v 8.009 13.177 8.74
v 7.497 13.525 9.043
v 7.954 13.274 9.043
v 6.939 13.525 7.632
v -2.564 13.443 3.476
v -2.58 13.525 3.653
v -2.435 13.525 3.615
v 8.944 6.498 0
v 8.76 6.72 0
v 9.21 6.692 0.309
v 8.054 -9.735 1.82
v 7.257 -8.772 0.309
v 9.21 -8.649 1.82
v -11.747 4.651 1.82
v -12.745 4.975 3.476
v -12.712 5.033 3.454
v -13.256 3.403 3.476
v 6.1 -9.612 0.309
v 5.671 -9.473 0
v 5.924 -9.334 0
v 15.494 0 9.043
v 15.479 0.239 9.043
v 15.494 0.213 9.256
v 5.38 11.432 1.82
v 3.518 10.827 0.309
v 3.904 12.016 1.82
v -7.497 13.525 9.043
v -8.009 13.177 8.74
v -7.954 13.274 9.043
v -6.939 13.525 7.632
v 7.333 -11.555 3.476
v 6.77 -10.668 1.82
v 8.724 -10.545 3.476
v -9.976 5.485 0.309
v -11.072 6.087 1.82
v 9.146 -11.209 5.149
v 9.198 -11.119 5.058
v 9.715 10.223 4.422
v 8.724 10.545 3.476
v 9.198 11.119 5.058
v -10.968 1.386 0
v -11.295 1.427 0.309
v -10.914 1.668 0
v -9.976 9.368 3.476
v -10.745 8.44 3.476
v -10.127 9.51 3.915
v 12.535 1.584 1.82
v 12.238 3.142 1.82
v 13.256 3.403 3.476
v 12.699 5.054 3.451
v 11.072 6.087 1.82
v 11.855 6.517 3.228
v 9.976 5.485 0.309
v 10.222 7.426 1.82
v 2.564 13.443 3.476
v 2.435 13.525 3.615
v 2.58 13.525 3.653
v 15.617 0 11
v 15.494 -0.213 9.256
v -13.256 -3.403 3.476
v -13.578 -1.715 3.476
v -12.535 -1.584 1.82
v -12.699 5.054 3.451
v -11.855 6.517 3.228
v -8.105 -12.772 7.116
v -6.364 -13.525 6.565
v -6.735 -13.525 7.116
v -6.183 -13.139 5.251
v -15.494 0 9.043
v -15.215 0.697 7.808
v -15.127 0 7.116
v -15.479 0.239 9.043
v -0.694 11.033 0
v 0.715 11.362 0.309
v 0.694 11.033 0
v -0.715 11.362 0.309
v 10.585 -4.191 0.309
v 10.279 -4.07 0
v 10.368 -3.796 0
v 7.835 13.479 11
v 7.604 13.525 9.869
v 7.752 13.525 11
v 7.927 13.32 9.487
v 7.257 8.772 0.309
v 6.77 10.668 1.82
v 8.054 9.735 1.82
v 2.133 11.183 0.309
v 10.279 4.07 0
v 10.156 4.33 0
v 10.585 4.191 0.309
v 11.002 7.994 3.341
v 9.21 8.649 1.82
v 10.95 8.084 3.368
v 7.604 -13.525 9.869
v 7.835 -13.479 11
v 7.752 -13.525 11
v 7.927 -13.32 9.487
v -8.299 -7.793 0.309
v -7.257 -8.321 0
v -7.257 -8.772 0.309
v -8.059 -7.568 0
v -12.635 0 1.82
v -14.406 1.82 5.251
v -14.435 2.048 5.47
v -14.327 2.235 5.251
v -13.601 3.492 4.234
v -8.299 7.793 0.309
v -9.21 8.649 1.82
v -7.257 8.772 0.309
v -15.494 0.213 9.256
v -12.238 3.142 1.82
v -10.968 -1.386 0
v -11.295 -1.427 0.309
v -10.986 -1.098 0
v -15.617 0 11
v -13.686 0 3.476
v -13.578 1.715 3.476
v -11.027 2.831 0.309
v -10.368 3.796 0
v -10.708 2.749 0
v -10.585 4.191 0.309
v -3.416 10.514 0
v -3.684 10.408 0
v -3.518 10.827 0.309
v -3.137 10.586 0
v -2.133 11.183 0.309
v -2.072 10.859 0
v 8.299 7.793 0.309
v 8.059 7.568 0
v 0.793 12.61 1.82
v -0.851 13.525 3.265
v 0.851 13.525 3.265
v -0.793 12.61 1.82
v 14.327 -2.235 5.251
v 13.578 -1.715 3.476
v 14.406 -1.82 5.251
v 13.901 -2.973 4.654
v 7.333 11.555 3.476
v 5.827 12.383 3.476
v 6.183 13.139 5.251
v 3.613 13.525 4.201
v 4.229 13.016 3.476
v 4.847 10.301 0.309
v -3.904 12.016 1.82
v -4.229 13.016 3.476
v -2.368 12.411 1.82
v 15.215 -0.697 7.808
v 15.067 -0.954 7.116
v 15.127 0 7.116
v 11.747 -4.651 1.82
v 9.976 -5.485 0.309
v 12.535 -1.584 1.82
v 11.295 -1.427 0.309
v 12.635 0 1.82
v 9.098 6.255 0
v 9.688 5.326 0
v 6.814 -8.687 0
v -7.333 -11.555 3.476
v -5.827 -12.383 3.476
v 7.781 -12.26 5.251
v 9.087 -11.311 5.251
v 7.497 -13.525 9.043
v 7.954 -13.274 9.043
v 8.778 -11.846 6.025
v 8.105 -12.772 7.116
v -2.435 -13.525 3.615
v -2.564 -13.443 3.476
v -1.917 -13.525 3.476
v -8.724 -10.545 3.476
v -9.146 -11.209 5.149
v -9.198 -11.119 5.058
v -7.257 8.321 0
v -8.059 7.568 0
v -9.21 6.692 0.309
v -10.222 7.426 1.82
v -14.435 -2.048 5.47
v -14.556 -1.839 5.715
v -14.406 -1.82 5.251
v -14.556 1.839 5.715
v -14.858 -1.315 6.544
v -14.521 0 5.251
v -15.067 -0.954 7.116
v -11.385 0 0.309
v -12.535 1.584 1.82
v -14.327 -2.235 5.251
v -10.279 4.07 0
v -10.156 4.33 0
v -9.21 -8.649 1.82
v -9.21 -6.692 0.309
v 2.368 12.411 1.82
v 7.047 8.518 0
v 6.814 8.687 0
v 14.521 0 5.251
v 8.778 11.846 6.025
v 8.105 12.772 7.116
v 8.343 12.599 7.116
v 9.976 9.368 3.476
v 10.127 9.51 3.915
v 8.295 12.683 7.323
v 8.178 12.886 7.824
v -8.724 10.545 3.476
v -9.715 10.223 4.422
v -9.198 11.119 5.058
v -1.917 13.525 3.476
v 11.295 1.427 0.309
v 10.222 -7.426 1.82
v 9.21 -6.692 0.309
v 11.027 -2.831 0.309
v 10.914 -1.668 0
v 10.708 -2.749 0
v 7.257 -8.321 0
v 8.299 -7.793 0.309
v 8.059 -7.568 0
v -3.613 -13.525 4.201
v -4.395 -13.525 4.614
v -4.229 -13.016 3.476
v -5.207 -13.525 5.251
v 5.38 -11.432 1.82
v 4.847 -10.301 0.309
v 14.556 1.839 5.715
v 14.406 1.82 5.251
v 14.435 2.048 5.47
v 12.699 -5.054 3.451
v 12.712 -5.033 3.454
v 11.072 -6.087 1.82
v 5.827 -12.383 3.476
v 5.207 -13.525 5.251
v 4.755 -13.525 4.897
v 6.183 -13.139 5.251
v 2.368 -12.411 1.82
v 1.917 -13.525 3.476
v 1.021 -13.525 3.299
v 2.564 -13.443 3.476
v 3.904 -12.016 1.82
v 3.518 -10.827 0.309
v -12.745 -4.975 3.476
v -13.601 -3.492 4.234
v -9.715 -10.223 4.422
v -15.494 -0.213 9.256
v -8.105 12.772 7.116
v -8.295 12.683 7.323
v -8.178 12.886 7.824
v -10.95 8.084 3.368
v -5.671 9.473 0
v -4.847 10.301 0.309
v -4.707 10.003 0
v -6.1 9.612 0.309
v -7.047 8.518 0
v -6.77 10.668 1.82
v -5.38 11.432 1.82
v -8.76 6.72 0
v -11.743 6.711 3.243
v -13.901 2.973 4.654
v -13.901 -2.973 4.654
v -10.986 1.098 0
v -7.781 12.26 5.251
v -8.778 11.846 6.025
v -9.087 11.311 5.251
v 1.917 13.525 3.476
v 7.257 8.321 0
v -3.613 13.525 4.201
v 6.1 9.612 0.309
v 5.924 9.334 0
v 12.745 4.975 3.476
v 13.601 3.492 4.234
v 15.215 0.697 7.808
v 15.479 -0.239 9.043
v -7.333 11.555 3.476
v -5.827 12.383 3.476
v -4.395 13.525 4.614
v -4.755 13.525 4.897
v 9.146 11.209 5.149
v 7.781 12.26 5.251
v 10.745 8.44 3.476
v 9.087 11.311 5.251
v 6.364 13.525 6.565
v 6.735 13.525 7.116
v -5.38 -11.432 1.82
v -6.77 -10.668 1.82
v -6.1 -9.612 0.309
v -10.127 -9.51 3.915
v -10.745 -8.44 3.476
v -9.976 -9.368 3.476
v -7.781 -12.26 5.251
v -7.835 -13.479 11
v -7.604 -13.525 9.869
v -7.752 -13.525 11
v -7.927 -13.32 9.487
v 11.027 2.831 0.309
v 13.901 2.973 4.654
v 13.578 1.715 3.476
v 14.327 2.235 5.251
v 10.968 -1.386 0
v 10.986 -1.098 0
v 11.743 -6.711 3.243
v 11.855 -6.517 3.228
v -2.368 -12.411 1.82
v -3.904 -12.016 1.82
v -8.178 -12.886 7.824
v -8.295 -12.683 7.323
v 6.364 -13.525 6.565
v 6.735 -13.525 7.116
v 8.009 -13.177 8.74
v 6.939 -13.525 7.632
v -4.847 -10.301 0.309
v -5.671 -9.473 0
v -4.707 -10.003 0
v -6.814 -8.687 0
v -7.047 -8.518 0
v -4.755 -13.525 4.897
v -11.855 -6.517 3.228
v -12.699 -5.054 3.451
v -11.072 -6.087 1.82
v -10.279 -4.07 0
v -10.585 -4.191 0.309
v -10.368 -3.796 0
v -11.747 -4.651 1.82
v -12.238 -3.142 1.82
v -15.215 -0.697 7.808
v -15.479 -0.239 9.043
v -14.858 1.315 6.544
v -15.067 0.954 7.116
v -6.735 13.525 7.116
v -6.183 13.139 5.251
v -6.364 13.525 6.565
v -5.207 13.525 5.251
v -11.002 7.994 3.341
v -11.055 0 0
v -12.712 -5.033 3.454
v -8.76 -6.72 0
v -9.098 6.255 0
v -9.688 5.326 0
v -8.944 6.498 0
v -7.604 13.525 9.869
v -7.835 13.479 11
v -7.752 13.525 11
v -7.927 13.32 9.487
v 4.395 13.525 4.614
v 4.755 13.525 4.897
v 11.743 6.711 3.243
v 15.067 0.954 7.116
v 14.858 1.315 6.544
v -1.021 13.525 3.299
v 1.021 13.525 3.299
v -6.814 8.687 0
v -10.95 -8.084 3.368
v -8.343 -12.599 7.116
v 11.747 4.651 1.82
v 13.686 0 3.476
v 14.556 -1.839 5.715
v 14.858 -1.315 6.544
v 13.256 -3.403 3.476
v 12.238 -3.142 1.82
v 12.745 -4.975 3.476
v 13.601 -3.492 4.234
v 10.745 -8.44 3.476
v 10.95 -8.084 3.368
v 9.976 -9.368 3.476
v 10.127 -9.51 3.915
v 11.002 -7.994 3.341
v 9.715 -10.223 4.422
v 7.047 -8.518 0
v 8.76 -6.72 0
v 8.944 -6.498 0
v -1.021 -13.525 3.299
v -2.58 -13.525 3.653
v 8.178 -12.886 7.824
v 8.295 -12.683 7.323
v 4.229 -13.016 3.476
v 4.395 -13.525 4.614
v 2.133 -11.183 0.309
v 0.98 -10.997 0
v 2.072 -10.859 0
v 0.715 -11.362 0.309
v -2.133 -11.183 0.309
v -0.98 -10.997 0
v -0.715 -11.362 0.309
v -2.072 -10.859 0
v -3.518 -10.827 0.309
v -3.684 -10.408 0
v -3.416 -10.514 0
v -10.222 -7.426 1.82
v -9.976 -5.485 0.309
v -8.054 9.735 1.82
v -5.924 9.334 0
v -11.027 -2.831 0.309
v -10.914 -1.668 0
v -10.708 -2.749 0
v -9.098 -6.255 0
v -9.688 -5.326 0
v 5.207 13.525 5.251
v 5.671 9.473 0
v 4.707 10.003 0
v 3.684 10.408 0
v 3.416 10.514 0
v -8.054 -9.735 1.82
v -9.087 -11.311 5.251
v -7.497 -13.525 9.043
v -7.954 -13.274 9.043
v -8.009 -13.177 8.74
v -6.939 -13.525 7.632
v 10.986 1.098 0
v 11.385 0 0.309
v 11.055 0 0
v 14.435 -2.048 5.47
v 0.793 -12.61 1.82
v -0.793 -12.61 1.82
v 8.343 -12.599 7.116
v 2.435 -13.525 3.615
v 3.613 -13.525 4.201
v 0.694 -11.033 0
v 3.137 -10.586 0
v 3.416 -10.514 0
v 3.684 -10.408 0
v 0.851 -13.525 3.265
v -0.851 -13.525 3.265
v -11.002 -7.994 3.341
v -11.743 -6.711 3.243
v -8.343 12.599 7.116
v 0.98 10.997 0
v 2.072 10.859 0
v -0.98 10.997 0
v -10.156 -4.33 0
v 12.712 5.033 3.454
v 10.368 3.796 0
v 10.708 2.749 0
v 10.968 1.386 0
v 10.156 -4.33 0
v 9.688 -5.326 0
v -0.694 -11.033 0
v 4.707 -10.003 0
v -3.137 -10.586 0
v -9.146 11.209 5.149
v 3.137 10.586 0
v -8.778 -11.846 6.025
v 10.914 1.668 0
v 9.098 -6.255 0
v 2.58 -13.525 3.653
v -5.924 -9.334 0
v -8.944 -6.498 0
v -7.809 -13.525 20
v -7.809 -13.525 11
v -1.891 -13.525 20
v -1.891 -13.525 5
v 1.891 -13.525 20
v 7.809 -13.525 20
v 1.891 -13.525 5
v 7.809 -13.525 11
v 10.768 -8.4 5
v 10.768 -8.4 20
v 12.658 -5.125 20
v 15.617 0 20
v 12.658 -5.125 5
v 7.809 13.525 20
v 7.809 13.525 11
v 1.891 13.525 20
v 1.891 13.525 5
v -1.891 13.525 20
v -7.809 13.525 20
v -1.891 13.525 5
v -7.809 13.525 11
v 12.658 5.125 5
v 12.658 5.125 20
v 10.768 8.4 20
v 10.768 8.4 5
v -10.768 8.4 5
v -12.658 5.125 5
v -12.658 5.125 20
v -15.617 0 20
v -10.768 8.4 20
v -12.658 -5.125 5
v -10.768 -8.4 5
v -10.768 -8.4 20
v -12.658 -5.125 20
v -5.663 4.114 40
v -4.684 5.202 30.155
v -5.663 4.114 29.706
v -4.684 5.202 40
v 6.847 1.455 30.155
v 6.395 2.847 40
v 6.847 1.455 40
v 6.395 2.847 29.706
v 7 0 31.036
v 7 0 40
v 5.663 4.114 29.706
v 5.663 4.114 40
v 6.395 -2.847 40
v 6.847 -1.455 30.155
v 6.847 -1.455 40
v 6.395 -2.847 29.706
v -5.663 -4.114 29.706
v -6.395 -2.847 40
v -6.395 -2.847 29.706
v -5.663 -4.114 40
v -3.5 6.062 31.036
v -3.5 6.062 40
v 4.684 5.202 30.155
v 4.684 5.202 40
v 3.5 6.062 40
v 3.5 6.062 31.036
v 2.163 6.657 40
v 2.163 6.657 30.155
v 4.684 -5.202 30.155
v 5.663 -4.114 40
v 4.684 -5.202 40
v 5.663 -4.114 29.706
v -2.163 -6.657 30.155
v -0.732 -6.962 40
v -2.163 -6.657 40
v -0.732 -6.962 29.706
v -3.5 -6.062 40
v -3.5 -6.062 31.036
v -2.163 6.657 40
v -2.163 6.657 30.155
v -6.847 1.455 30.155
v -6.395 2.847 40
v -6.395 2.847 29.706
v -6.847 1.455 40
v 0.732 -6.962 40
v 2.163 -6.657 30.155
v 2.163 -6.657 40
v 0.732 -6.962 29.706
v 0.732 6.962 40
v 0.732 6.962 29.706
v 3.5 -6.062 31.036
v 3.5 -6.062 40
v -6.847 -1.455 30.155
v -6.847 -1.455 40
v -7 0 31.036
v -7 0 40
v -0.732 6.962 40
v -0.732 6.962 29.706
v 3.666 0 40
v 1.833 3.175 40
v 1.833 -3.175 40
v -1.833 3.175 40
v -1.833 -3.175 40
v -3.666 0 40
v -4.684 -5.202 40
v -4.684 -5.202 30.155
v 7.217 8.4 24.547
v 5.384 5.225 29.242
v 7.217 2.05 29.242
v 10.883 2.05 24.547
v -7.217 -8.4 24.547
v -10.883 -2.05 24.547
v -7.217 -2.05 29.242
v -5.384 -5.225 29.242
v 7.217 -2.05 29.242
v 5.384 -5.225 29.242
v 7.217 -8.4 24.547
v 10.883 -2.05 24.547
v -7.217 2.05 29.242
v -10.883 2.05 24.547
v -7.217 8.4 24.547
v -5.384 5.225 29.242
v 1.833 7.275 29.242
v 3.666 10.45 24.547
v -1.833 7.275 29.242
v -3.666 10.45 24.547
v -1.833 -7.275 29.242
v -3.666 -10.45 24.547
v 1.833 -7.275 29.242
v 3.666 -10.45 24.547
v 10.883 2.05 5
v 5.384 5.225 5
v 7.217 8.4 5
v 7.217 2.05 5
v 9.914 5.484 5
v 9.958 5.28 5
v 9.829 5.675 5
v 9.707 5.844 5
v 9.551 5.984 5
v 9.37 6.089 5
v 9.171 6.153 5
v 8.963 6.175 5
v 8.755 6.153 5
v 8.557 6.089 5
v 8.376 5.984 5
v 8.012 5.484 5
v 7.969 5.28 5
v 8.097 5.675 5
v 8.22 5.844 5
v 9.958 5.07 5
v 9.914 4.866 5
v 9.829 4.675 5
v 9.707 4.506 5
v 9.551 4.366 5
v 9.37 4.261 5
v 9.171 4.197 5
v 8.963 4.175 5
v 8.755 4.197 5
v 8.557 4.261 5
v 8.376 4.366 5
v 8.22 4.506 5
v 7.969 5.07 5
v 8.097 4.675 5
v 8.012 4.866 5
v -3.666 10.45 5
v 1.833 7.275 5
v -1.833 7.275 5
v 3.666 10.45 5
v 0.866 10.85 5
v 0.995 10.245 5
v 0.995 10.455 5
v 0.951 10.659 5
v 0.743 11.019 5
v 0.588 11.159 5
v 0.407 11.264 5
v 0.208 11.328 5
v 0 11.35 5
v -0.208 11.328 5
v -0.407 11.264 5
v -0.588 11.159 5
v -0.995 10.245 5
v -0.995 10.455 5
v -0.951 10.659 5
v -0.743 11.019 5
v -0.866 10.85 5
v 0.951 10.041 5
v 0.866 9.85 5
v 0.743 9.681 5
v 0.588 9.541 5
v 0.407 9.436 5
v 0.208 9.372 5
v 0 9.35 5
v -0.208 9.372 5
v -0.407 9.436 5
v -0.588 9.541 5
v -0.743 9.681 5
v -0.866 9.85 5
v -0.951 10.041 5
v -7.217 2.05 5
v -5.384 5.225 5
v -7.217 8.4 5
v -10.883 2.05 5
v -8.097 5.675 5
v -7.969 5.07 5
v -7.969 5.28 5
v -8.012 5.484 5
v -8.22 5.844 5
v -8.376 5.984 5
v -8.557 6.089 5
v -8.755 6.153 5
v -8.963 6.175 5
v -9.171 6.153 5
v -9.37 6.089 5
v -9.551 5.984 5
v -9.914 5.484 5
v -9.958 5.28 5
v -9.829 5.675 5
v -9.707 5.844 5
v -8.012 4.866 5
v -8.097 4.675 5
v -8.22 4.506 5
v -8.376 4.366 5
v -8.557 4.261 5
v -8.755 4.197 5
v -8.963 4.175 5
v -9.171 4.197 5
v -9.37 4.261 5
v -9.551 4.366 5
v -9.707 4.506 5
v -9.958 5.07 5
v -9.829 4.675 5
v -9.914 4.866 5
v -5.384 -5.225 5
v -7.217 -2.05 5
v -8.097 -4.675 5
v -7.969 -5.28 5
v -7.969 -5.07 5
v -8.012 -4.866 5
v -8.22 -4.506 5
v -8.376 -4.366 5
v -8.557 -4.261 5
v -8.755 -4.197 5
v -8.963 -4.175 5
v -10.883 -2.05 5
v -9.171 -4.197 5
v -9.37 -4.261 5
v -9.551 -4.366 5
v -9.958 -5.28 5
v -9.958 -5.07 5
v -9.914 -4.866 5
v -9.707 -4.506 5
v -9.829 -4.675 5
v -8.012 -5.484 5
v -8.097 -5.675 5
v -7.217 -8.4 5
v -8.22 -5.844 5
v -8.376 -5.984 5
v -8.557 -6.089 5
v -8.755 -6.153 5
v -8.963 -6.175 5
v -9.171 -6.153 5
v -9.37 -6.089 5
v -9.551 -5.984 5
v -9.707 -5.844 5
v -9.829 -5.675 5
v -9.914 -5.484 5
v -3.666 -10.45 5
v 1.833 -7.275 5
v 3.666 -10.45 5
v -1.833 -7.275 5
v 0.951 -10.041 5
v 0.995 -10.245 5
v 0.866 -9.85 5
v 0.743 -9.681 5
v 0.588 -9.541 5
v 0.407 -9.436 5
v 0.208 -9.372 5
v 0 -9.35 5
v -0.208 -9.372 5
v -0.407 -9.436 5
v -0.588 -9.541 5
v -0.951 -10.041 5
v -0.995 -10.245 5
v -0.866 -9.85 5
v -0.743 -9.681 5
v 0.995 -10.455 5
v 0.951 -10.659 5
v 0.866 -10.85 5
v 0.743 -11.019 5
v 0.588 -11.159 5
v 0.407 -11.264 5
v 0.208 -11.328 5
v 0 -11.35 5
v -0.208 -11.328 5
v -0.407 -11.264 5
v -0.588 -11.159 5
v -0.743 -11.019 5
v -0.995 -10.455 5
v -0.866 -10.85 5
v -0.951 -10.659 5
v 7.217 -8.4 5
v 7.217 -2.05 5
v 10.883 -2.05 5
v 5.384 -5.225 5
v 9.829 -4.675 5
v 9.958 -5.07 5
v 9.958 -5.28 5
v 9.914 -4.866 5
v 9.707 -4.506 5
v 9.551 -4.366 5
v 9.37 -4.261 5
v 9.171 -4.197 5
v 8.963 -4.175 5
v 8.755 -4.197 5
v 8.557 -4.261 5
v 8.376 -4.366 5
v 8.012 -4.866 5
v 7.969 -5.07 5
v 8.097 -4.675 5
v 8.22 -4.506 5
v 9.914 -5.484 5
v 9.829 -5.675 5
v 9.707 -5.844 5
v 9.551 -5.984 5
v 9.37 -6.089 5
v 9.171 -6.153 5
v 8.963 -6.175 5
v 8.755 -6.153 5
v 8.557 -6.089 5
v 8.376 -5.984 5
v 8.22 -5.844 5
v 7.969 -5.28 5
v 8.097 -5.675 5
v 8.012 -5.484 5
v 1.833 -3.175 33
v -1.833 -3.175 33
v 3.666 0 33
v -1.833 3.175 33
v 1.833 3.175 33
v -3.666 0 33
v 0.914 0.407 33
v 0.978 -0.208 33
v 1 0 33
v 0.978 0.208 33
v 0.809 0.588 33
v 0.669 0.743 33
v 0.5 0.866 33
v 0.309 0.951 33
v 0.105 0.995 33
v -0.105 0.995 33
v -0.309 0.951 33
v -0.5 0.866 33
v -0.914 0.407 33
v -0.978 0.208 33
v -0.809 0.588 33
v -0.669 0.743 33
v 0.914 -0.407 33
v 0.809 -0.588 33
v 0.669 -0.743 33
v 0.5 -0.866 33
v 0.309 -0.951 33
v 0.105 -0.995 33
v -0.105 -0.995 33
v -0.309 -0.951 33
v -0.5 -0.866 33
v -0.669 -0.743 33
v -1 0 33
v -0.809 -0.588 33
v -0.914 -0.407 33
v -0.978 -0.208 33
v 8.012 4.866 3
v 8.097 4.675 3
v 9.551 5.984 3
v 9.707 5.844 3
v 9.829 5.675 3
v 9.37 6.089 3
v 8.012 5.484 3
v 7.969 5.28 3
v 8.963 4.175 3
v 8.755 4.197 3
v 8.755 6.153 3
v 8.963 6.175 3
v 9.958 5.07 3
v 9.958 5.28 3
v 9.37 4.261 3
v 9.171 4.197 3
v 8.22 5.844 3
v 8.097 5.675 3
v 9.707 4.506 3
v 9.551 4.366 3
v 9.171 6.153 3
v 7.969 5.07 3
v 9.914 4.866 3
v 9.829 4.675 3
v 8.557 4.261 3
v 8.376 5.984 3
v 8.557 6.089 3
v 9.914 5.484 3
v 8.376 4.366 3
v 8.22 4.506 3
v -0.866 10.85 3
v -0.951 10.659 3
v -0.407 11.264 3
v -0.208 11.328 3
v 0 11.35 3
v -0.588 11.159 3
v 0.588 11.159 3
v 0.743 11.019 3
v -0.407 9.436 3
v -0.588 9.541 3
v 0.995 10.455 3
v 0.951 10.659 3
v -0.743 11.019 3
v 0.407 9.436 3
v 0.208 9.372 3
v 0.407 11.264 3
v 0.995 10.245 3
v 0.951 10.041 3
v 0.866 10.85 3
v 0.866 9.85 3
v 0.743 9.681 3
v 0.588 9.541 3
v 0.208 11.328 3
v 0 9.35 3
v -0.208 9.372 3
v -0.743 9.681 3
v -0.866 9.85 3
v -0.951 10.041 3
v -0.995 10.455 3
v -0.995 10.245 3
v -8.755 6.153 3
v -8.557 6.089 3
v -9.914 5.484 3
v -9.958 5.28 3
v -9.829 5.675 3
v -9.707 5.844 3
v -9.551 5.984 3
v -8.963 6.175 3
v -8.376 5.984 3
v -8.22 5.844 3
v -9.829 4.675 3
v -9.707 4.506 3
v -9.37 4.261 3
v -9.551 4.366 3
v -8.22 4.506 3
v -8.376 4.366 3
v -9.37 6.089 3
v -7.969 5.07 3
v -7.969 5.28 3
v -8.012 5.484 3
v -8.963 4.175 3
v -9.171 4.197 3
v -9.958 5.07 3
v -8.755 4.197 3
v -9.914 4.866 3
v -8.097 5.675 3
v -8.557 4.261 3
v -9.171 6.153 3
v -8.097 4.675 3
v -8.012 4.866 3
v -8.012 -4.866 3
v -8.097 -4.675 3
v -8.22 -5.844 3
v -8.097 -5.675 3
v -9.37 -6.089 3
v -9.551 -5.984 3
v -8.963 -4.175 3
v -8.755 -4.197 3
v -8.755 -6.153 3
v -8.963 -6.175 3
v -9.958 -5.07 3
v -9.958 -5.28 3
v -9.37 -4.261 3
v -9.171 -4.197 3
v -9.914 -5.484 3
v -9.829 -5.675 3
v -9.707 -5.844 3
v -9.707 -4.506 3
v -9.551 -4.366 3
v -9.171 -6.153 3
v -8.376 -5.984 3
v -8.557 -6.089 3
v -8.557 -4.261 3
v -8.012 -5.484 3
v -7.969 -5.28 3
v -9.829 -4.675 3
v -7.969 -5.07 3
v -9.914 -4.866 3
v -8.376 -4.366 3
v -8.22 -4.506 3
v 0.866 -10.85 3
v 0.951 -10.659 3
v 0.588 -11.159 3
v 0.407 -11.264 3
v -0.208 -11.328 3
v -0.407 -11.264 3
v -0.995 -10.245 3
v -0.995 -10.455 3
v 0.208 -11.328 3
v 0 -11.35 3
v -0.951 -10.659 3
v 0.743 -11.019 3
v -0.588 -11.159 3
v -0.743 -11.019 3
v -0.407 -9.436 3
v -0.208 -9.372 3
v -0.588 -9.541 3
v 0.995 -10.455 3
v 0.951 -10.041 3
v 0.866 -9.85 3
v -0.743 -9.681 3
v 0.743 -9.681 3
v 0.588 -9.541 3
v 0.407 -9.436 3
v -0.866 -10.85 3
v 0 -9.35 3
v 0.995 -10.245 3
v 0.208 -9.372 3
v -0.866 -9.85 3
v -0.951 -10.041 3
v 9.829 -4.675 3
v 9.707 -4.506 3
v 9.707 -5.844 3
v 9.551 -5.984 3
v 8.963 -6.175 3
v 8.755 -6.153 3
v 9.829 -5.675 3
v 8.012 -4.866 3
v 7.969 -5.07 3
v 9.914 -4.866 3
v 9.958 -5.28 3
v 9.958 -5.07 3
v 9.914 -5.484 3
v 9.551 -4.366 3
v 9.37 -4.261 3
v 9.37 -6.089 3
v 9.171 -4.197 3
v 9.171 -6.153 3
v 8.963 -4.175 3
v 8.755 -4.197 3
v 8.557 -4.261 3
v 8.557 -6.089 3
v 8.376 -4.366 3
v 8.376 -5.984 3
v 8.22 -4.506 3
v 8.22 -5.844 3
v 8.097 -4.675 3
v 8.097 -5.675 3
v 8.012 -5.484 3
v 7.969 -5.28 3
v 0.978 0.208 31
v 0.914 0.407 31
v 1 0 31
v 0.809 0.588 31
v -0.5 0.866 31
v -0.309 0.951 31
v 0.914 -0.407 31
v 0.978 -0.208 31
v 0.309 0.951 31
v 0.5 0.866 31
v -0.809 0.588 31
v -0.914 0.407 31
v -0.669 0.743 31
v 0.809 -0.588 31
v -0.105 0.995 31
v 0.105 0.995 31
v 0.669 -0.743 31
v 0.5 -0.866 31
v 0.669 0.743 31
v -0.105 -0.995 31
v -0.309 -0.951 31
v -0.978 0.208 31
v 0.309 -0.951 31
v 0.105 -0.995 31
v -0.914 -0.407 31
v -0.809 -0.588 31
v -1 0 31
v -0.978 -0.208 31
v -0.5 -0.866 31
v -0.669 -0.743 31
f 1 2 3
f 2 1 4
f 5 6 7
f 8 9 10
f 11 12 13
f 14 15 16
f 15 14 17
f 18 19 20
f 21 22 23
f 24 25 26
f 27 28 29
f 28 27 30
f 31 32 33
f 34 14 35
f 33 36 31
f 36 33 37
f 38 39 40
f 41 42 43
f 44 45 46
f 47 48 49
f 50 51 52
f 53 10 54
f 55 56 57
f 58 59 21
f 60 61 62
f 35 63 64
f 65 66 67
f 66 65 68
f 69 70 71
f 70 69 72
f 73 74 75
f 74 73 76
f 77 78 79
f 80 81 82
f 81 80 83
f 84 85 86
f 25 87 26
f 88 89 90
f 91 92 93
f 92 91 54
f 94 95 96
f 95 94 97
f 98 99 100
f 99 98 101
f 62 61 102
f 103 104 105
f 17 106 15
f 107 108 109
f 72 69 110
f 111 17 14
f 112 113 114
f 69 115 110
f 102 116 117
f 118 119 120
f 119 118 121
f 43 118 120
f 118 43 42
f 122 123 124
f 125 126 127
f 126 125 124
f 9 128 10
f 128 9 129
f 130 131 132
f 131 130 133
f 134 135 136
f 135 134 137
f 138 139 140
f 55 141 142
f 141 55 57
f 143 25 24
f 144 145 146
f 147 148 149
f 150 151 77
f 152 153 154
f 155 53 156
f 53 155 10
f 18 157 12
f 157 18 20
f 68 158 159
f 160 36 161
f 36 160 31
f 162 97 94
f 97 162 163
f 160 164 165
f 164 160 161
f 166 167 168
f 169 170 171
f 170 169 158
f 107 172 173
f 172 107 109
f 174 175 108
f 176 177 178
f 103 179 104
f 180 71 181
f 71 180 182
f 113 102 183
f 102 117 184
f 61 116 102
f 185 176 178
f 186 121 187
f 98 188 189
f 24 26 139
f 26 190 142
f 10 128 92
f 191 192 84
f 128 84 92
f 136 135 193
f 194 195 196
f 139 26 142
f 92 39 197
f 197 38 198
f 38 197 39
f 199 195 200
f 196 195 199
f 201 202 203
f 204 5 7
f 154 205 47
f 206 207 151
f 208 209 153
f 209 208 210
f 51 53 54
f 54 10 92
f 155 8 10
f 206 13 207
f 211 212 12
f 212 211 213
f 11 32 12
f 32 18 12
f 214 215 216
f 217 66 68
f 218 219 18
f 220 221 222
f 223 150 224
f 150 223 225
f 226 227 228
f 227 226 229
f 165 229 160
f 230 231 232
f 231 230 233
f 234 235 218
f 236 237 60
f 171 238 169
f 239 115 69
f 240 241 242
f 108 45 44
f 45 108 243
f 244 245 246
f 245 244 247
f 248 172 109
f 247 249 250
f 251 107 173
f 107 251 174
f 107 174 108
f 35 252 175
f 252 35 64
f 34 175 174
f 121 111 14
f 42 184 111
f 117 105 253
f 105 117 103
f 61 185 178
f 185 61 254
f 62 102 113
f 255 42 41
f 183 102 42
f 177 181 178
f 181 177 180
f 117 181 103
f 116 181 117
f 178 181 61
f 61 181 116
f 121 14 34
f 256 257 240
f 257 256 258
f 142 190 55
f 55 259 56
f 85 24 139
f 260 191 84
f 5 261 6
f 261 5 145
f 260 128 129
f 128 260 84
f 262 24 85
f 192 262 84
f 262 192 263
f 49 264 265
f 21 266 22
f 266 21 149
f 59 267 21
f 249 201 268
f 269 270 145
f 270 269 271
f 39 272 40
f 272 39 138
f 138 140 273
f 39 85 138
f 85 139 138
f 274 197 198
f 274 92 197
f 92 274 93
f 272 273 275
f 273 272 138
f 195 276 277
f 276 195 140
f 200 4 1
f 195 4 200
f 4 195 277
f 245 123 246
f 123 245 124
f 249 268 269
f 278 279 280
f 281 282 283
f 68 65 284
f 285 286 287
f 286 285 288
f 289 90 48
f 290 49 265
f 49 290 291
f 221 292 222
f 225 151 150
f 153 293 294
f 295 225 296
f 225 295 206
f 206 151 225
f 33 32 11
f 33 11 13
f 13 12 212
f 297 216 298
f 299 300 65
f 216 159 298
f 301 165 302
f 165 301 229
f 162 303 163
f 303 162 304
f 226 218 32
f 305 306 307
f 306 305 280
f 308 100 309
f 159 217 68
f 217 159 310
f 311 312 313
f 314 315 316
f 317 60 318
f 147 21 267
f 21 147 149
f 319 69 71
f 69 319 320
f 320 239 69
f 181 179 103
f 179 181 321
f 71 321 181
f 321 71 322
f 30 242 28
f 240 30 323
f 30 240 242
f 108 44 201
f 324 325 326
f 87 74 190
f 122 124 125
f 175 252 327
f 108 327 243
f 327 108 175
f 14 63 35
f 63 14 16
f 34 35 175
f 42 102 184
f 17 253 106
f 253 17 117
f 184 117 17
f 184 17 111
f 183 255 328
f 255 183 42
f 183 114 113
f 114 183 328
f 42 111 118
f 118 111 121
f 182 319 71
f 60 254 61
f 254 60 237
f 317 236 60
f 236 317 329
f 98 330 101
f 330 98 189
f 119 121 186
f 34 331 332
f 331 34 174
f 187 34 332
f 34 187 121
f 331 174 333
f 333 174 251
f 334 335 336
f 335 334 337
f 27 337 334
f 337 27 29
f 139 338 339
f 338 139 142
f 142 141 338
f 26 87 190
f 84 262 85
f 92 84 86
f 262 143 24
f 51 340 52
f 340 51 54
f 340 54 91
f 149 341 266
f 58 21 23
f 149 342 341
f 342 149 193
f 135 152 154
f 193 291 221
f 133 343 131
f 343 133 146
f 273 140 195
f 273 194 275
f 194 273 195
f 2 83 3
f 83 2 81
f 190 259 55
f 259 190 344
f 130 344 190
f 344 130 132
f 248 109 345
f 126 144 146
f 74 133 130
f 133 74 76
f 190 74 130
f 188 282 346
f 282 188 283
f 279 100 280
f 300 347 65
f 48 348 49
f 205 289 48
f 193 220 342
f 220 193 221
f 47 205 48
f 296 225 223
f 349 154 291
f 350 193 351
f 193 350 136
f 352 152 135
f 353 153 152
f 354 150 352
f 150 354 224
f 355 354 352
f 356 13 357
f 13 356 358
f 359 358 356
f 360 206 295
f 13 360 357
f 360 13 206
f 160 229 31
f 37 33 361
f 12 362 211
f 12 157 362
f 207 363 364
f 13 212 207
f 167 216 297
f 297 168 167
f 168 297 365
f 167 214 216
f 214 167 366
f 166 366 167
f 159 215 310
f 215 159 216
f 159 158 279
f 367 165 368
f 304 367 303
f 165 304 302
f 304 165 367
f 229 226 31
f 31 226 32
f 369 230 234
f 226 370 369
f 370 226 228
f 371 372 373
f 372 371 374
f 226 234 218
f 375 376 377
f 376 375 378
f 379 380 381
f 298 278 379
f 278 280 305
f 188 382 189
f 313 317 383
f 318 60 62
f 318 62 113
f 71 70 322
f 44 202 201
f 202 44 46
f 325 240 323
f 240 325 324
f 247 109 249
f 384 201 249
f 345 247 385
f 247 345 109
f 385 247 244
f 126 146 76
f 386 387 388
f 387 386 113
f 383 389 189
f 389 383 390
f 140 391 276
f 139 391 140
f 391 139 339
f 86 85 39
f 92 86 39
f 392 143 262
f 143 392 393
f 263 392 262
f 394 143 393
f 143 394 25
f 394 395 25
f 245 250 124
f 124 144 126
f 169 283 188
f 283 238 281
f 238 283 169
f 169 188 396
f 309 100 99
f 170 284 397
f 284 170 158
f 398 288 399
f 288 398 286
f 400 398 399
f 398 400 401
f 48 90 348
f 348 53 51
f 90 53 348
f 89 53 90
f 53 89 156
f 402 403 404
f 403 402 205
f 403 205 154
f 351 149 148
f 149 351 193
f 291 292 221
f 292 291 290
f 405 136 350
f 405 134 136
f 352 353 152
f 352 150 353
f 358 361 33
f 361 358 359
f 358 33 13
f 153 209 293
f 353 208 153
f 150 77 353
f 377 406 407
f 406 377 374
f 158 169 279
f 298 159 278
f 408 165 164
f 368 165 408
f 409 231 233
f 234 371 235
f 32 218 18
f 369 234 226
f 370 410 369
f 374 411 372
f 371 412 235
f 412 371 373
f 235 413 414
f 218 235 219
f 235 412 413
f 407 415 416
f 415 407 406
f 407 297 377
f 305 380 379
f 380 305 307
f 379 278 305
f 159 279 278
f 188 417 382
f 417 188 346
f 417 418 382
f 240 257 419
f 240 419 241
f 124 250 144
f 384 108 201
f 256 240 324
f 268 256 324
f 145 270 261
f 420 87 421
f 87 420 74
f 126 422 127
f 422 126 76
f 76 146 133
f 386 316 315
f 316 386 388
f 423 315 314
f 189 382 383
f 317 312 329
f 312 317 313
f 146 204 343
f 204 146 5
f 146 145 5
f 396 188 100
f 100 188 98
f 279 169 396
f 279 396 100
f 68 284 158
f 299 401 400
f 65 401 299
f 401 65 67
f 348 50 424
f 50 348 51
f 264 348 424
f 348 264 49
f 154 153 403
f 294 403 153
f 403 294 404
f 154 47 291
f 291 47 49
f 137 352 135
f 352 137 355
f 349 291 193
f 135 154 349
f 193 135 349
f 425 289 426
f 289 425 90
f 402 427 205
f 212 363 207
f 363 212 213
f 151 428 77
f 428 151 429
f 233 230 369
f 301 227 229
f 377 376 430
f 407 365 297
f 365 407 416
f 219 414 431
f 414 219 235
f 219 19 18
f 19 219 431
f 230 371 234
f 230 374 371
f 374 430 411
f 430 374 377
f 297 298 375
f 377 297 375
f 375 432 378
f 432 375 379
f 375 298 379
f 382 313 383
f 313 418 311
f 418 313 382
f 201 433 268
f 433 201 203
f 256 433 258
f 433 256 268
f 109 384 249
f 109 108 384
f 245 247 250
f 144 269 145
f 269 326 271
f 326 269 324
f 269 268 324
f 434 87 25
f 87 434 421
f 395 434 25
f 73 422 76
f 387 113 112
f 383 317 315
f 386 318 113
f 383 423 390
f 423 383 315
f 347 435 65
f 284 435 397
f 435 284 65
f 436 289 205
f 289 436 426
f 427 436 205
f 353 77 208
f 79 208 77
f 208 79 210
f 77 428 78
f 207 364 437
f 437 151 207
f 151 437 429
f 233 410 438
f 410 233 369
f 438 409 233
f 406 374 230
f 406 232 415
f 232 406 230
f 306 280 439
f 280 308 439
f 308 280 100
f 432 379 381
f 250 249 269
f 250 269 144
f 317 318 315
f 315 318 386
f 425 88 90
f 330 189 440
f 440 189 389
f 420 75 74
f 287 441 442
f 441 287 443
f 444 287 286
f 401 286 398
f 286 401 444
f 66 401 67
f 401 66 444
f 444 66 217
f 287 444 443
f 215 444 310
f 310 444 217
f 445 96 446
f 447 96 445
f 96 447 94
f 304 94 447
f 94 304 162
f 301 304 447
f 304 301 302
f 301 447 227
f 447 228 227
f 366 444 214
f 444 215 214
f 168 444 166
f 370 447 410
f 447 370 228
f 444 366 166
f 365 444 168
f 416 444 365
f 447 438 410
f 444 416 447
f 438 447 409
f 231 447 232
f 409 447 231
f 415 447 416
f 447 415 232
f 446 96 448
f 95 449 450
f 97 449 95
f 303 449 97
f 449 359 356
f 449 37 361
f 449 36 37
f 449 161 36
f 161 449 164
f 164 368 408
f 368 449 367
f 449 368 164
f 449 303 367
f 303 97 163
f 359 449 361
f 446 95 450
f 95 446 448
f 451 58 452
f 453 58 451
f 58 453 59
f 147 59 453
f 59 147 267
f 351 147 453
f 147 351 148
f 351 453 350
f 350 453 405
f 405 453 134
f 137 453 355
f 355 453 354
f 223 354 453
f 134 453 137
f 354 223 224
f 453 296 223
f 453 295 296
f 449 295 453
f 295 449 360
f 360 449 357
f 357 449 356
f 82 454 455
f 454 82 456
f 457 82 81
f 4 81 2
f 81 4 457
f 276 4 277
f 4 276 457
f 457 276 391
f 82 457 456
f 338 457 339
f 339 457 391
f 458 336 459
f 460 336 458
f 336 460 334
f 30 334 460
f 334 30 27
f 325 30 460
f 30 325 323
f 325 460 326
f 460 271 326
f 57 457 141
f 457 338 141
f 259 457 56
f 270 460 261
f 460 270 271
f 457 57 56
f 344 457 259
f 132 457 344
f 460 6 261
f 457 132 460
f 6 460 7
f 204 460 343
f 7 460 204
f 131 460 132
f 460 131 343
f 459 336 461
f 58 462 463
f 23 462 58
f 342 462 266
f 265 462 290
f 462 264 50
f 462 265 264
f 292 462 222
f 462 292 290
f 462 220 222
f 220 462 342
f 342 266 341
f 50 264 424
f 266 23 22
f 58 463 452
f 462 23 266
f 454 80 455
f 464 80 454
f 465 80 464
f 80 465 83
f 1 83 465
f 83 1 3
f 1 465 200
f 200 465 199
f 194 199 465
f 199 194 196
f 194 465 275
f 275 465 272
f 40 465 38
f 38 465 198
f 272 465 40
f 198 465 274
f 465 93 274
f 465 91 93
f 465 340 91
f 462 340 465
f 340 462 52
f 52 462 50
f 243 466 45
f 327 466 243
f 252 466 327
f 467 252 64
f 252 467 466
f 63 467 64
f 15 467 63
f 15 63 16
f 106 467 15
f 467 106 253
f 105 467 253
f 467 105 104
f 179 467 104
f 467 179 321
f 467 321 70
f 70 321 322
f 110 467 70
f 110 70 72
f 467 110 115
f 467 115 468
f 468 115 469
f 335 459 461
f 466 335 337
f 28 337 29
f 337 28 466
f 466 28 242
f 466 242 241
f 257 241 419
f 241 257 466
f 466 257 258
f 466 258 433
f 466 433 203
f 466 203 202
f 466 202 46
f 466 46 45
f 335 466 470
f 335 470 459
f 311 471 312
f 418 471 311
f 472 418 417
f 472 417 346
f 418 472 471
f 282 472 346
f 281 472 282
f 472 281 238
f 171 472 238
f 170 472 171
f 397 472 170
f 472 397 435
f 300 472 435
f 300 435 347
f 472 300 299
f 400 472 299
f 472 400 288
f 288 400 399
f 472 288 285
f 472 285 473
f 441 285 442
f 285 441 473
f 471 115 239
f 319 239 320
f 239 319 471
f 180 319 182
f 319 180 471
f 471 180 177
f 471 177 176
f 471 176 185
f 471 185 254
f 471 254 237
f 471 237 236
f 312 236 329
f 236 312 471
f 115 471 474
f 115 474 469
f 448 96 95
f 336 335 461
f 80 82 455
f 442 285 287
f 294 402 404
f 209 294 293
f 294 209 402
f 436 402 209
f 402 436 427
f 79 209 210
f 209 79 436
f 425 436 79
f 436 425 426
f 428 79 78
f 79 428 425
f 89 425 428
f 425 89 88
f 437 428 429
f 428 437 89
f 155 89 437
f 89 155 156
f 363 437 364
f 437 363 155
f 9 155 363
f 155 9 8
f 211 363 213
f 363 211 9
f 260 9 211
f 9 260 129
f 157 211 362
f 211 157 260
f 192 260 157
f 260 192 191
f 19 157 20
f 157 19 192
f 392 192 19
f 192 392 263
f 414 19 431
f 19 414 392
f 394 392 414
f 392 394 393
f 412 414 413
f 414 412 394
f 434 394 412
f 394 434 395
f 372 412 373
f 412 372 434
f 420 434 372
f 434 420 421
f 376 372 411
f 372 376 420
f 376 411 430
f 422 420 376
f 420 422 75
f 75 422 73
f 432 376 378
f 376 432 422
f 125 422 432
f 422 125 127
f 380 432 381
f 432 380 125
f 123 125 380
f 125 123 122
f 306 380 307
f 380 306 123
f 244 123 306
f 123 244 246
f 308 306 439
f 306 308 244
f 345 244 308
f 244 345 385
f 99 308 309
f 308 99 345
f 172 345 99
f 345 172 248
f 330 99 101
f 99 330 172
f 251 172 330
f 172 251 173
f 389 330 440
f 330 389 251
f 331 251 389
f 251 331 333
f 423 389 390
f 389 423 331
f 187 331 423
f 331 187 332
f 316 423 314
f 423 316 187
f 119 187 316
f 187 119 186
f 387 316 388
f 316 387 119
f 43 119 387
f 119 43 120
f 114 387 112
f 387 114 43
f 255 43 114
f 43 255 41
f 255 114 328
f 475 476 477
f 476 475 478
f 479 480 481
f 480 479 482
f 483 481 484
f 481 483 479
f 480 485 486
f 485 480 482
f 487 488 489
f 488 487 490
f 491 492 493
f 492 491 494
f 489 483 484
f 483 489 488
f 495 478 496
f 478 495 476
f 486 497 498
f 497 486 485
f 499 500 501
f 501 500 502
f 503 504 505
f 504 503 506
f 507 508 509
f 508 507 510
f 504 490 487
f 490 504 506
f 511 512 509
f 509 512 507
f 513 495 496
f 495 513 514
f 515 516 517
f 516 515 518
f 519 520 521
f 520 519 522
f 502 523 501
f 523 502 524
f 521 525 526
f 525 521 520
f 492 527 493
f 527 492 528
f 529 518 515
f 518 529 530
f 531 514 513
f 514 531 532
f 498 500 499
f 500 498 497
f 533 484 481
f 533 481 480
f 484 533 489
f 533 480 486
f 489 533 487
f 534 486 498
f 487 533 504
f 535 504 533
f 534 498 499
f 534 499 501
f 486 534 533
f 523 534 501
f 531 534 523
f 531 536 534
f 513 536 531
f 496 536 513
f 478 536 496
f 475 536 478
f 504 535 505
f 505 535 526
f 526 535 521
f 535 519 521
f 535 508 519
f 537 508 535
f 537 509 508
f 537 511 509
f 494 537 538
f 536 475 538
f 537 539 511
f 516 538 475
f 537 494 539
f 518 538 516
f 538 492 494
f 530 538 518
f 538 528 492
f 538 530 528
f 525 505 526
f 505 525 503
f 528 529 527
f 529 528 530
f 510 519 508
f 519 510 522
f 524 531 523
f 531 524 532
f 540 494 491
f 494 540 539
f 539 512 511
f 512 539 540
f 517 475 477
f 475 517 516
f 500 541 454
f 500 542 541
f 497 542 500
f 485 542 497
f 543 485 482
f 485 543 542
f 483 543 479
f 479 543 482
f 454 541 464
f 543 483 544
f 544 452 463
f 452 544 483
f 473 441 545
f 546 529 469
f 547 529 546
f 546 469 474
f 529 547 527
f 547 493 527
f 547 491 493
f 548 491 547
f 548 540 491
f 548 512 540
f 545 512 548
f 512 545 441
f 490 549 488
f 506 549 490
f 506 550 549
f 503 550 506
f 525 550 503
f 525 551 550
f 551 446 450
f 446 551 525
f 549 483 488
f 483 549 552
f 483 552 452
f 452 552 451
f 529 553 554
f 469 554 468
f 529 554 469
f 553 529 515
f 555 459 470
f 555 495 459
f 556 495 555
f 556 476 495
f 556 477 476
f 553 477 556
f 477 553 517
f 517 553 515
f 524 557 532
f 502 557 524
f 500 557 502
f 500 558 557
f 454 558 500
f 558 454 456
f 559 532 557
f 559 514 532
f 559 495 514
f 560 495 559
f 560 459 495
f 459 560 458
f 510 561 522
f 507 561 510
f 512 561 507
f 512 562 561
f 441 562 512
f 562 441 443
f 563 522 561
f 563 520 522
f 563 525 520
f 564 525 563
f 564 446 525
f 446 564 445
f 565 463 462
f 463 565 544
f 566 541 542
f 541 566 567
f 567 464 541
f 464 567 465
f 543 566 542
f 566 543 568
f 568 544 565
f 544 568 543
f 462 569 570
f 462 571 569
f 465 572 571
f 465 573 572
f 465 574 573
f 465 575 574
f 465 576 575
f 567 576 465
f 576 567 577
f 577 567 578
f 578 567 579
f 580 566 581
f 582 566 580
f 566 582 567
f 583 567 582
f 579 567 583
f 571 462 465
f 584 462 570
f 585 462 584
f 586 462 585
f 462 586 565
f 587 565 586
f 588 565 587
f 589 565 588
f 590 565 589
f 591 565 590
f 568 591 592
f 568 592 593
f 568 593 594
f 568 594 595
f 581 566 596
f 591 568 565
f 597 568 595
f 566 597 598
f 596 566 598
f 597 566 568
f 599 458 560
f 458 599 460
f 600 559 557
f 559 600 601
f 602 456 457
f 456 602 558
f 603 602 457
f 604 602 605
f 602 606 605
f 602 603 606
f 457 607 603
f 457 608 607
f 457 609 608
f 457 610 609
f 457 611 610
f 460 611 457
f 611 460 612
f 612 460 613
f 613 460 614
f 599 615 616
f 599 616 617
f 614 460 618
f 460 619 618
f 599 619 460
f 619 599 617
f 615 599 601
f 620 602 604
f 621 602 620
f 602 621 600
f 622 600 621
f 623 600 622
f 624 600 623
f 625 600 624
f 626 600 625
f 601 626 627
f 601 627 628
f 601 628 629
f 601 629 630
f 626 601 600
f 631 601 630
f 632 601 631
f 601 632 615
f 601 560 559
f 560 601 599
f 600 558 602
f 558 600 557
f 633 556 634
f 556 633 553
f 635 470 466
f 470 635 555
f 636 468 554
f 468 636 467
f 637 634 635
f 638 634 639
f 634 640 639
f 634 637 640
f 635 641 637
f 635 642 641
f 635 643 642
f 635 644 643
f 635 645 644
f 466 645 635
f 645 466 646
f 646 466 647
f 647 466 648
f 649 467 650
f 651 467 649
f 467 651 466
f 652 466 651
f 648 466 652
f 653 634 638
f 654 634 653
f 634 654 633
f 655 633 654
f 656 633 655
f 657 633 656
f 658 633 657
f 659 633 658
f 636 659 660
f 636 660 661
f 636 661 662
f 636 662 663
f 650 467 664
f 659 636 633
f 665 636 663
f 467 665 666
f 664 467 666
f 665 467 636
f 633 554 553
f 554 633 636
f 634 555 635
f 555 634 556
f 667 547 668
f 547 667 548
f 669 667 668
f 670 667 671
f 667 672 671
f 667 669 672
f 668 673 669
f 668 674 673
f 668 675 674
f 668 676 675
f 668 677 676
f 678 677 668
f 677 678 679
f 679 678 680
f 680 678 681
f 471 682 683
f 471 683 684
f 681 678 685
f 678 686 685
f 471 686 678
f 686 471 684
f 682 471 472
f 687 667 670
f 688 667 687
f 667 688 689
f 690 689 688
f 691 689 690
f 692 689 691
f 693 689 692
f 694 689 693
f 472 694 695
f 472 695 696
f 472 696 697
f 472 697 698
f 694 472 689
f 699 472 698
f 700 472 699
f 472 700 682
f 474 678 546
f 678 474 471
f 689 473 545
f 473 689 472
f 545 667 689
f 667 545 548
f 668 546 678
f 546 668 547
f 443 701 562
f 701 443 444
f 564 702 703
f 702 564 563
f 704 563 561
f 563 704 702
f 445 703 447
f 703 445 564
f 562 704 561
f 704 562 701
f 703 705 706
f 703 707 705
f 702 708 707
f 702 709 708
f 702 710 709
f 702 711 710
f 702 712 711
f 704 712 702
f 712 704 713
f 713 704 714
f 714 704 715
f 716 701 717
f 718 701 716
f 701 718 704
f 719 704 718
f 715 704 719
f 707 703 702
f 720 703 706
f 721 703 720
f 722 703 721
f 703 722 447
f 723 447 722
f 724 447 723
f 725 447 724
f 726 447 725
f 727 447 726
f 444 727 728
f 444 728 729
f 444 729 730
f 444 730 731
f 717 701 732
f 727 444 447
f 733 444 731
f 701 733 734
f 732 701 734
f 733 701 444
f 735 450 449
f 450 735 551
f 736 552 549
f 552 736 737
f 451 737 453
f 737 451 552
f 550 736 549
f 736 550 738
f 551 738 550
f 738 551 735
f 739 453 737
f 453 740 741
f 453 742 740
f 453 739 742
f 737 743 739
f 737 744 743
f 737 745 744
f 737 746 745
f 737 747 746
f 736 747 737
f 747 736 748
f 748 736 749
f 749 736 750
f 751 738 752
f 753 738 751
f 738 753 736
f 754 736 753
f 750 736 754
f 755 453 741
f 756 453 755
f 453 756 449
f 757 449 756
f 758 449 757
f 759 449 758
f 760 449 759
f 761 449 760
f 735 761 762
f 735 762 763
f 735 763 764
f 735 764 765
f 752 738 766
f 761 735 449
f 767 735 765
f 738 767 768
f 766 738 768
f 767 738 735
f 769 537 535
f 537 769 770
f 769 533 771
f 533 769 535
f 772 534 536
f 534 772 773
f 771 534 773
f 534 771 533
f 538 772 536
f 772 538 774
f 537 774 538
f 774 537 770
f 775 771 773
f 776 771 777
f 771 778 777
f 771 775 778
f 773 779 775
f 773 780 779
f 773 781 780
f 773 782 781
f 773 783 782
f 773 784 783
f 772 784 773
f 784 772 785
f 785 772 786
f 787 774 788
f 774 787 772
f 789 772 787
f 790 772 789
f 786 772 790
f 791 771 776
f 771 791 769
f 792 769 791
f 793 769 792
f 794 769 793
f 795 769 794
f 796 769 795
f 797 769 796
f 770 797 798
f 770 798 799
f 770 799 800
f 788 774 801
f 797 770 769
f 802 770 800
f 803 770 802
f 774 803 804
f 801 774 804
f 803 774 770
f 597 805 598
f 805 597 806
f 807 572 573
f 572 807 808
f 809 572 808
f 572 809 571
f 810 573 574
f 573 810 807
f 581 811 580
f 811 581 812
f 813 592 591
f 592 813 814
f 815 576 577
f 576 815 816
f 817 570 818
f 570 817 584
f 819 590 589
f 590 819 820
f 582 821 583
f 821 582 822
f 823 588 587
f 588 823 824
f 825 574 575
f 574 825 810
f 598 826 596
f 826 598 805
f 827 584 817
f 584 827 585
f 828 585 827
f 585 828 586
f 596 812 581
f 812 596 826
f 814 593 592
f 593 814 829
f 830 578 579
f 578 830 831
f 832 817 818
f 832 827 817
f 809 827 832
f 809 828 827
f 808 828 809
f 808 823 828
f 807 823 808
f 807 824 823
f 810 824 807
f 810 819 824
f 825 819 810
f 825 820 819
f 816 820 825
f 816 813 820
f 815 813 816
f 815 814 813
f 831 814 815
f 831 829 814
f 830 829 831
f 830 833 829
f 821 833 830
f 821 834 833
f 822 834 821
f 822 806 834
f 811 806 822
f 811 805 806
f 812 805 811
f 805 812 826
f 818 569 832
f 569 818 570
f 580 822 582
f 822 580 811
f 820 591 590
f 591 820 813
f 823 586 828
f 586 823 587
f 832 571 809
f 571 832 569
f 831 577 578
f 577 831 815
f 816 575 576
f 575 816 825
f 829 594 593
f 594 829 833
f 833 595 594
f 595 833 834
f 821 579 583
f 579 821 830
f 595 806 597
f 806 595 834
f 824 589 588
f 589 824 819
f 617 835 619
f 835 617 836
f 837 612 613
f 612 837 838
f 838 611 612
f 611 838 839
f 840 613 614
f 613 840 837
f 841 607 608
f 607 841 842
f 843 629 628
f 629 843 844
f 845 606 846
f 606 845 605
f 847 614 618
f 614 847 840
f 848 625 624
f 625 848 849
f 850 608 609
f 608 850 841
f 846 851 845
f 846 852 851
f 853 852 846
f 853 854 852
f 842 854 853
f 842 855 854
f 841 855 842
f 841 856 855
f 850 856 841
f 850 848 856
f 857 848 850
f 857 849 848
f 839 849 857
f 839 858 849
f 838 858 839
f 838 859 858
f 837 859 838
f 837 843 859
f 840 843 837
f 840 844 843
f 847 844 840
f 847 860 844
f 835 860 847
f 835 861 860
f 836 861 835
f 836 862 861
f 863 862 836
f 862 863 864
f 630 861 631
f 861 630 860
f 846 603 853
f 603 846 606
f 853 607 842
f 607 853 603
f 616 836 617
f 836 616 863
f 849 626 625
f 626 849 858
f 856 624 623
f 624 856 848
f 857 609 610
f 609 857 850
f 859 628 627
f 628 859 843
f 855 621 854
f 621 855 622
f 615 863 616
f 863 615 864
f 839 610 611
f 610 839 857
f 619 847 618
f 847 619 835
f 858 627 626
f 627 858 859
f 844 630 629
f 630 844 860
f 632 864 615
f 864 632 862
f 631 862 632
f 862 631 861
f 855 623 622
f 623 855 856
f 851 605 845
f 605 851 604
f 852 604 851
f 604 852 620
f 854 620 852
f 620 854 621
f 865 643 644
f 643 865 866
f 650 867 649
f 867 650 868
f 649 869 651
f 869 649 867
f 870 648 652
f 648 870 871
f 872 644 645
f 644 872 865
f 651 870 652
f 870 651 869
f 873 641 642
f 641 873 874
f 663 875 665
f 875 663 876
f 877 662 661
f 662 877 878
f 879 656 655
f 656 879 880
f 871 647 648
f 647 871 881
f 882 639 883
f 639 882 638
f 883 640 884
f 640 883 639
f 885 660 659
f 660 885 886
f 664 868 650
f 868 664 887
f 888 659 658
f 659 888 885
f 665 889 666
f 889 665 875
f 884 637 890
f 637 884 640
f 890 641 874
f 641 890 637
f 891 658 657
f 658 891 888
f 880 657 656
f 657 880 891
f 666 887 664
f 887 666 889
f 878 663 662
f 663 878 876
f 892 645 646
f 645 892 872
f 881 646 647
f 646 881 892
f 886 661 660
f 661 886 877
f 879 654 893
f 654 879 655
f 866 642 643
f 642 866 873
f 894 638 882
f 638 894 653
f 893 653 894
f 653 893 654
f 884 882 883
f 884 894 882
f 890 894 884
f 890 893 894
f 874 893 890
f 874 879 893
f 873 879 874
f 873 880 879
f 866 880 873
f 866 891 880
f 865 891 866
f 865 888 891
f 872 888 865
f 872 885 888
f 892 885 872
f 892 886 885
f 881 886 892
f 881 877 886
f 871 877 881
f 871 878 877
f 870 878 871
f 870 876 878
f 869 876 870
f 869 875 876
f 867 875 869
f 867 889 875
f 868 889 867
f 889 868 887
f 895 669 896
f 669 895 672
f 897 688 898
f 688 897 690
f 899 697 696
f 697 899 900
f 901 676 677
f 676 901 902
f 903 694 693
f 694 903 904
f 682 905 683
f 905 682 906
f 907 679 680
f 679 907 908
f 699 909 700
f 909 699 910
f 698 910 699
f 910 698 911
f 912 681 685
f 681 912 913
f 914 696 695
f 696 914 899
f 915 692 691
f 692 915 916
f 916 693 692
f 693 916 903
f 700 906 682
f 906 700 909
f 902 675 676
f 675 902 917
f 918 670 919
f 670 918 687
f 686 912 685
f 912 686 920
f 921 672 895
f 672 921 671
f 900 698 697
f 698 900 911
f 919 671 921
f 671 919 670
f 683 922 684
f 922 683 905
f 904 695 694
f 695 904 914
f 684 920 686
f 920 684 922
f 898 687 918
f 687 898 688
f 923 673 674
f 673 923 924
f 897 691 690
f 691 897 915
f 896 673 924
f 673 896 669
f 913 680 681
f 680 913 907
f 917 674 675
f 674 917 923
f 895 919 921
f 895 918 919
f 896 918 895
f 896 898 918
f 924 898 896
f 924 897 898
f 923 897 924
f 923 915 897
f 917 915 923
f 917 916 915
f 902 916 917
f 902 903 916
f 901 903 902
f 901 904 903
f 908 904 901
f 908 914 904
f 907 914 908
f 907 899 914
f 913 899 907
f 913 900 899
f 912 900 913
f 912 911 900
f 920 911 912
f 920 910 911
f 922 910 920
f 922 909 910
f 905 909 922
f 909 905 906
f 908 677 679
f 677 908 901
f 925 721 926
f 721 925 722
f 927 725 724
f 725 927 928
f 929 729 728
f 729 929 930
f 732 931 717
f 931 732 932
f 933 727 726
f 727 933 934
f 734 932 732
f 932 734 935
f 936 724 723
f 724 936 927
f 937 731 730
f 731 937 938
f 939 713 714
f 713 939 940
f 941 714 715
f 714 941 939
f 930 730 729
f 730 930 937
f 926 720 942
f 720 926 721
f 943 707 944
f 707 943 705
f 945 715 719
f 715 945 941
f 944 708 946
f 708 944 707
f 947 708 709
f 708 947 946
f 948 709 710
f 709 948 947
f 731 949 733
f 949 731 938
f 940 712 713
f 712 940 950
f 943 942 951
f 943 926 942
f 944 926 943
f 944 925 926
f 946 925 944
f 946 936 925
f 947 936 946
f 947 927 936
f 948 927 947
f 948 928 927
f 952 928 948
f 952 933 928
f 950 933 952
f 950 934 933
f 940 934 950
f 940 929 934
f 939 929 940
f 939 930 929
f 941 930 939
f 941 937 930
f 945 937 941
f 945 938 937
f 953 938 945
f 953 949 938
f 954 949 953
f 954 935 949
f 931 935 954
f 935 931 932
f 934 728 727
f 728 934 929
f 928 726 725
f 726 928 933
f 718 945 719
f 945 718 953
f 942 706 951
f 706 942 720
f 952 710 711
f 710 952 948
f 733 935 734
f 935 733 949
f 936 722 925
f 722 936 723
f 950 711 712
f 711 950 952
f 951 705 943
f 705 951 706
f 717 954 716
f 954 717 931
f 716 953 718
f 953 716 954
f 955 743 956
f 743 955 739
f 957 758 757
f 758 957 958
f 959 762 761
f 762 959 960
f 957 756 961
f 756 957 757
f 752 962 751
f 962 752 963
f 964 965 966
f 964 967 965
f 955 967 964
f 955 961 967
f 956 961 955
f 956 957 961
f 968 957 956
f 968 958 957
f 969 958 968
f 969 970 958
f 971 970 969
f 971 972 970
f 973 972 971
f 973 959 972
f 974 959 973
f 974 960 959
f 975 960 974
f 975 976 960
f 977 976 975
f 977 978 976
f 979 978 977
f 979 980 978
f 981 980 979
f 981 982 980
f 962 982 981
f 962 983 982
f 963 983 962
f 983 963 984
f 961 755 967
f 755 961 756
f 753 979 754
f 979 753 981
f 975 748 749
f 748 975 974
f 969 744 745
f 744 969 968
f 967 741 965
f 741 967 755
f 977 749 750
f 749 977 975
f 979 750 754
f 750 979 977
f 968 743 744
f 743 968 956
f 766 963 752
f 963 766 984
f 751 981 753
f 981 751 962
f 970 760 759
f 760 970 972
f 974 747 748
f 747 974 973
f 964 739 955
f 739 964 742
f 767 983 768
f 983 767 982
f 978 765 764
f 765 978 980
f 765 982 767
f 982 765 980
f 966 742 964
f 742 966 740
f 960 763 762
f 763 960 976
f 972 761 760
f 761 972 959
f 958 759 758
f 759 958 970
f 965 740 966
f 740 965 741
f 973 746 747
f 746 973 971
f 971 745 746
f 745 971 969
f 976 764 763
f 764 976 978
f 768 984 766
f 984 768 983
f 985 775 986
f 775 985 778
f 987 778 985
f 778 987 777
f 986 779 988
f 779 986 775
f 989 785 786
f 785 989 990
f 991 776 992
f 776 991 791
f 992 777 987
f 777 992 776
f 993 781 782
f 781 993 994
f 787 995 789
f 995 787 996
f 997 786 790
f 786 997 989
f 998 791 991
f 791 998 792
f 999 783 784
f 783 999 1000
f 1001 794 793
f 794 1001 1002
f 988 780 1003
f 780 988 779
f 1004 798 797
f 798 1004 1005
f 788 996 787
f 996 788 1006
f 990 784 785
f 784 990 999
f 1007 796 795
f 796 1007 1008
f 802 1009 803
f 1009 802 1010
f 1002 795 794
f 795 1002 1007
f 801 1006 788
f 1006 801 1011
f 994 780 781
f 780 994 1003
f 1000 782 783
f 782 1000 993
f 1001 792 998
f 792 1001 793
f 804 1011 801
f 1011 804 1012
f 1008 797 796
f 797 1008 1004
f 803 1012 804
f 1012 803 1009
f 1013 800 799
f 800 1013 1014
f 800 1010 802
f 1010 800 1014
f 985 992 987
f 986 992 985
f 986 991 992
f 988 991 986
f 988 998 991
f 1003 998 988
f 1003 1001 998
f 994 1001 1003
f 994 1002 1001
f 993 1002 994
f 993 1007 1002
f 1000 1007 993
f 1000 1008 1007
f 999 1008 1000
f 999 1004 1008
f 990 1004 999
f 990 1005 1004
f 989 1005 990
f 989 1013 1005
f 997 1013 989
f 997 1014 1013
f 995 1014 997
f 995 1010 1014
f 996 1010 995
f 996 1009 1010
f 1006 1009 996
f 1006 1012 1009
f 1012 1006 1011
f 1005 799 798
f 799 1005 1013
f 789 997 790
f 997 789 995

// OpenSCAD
//Creates a customisable scredriver bit holder

//Number of bits
bits = 6; //[3:15]
//increase or decrease to fit tolerance for bits
bitf2f = 6.35; 

//radius of the magnet you are going to use
magnetr = 1;

//height of the magnet you are going to use
magneth = 2;

//walls between bits on the side.  If you set it too small it will take the minimal value
walls = 4;

//Radius of the center column
center_rad = 7;

//height of the total thing
height = 40;

//height of handle
height2 = 20;

//more or less bulb at the bottom
heightb = 11;

//-------------------
//maths

bitd = bitf2f / cos(30);  
bitr = bitd/2;

centerr = max(bitr, center_rad);


theta = 360 / bits;

x1 = tan(theta/2) * bitf2f / 2;
x2 = bitr + (walls/2/cos(theta/2));
x = x1 + x2;
outerr = max(
	centerr + bitf2f + (tan(theta/4) * x),
	x / sin(theta/2));

ringr = max(centerr, outerr - (bitf2f/2) - (tan(theta/4) * x));



//-----------------


module bits() {
	translate([0,0,height - 7])cylinder(r = bitr, h = 50, $fn = 6);	
	for (i = [theta/2: theta:360]) {
		rotate([0,0,i])translate([ringr + 0.1, 0 , height2 - 15])rotate([0,0,30])cylinder(r = bitr, h = 50, $fn = 6);	
	}
}

module magnets() {
	translate([0,0,height - 7 - magneth])cylinder(r = magnetr, h = magneth + 1, $fn = 30);	
	for (i = [theta/2: theta:360]) {
		rotate([0,0,i])translate([ringr, 0 , height2 - 15- magneth])cylinder(r = magnetr, h = magneth + 1, $fn = 30);	
	}
}

module body(){
	cylinder(r = centerr, h = height, $fn = 30);	
	
	translate([0, 0, height2])cylinder(r1 = outerr, r2 = 0, h = 20, $fn = bits);

	
	intersection() {
		//rounded bottom
		translate([0, 0, heightb]) {
			intersection() {
	 			sphere(outerr, $fn = 50);
	 			cylinder(r = outerr, h =outerr *2 , center=true, $fn = bits);
			}
			cylinder(r = outerr, h = height, center=false, $fn = bits);
		}	

		//cut top and bottom
		translate ([-250, -250,0])cube([500, 500, height2]);
	}
	

}

difference() {
	body();	
	bits();
	magnets();
}
